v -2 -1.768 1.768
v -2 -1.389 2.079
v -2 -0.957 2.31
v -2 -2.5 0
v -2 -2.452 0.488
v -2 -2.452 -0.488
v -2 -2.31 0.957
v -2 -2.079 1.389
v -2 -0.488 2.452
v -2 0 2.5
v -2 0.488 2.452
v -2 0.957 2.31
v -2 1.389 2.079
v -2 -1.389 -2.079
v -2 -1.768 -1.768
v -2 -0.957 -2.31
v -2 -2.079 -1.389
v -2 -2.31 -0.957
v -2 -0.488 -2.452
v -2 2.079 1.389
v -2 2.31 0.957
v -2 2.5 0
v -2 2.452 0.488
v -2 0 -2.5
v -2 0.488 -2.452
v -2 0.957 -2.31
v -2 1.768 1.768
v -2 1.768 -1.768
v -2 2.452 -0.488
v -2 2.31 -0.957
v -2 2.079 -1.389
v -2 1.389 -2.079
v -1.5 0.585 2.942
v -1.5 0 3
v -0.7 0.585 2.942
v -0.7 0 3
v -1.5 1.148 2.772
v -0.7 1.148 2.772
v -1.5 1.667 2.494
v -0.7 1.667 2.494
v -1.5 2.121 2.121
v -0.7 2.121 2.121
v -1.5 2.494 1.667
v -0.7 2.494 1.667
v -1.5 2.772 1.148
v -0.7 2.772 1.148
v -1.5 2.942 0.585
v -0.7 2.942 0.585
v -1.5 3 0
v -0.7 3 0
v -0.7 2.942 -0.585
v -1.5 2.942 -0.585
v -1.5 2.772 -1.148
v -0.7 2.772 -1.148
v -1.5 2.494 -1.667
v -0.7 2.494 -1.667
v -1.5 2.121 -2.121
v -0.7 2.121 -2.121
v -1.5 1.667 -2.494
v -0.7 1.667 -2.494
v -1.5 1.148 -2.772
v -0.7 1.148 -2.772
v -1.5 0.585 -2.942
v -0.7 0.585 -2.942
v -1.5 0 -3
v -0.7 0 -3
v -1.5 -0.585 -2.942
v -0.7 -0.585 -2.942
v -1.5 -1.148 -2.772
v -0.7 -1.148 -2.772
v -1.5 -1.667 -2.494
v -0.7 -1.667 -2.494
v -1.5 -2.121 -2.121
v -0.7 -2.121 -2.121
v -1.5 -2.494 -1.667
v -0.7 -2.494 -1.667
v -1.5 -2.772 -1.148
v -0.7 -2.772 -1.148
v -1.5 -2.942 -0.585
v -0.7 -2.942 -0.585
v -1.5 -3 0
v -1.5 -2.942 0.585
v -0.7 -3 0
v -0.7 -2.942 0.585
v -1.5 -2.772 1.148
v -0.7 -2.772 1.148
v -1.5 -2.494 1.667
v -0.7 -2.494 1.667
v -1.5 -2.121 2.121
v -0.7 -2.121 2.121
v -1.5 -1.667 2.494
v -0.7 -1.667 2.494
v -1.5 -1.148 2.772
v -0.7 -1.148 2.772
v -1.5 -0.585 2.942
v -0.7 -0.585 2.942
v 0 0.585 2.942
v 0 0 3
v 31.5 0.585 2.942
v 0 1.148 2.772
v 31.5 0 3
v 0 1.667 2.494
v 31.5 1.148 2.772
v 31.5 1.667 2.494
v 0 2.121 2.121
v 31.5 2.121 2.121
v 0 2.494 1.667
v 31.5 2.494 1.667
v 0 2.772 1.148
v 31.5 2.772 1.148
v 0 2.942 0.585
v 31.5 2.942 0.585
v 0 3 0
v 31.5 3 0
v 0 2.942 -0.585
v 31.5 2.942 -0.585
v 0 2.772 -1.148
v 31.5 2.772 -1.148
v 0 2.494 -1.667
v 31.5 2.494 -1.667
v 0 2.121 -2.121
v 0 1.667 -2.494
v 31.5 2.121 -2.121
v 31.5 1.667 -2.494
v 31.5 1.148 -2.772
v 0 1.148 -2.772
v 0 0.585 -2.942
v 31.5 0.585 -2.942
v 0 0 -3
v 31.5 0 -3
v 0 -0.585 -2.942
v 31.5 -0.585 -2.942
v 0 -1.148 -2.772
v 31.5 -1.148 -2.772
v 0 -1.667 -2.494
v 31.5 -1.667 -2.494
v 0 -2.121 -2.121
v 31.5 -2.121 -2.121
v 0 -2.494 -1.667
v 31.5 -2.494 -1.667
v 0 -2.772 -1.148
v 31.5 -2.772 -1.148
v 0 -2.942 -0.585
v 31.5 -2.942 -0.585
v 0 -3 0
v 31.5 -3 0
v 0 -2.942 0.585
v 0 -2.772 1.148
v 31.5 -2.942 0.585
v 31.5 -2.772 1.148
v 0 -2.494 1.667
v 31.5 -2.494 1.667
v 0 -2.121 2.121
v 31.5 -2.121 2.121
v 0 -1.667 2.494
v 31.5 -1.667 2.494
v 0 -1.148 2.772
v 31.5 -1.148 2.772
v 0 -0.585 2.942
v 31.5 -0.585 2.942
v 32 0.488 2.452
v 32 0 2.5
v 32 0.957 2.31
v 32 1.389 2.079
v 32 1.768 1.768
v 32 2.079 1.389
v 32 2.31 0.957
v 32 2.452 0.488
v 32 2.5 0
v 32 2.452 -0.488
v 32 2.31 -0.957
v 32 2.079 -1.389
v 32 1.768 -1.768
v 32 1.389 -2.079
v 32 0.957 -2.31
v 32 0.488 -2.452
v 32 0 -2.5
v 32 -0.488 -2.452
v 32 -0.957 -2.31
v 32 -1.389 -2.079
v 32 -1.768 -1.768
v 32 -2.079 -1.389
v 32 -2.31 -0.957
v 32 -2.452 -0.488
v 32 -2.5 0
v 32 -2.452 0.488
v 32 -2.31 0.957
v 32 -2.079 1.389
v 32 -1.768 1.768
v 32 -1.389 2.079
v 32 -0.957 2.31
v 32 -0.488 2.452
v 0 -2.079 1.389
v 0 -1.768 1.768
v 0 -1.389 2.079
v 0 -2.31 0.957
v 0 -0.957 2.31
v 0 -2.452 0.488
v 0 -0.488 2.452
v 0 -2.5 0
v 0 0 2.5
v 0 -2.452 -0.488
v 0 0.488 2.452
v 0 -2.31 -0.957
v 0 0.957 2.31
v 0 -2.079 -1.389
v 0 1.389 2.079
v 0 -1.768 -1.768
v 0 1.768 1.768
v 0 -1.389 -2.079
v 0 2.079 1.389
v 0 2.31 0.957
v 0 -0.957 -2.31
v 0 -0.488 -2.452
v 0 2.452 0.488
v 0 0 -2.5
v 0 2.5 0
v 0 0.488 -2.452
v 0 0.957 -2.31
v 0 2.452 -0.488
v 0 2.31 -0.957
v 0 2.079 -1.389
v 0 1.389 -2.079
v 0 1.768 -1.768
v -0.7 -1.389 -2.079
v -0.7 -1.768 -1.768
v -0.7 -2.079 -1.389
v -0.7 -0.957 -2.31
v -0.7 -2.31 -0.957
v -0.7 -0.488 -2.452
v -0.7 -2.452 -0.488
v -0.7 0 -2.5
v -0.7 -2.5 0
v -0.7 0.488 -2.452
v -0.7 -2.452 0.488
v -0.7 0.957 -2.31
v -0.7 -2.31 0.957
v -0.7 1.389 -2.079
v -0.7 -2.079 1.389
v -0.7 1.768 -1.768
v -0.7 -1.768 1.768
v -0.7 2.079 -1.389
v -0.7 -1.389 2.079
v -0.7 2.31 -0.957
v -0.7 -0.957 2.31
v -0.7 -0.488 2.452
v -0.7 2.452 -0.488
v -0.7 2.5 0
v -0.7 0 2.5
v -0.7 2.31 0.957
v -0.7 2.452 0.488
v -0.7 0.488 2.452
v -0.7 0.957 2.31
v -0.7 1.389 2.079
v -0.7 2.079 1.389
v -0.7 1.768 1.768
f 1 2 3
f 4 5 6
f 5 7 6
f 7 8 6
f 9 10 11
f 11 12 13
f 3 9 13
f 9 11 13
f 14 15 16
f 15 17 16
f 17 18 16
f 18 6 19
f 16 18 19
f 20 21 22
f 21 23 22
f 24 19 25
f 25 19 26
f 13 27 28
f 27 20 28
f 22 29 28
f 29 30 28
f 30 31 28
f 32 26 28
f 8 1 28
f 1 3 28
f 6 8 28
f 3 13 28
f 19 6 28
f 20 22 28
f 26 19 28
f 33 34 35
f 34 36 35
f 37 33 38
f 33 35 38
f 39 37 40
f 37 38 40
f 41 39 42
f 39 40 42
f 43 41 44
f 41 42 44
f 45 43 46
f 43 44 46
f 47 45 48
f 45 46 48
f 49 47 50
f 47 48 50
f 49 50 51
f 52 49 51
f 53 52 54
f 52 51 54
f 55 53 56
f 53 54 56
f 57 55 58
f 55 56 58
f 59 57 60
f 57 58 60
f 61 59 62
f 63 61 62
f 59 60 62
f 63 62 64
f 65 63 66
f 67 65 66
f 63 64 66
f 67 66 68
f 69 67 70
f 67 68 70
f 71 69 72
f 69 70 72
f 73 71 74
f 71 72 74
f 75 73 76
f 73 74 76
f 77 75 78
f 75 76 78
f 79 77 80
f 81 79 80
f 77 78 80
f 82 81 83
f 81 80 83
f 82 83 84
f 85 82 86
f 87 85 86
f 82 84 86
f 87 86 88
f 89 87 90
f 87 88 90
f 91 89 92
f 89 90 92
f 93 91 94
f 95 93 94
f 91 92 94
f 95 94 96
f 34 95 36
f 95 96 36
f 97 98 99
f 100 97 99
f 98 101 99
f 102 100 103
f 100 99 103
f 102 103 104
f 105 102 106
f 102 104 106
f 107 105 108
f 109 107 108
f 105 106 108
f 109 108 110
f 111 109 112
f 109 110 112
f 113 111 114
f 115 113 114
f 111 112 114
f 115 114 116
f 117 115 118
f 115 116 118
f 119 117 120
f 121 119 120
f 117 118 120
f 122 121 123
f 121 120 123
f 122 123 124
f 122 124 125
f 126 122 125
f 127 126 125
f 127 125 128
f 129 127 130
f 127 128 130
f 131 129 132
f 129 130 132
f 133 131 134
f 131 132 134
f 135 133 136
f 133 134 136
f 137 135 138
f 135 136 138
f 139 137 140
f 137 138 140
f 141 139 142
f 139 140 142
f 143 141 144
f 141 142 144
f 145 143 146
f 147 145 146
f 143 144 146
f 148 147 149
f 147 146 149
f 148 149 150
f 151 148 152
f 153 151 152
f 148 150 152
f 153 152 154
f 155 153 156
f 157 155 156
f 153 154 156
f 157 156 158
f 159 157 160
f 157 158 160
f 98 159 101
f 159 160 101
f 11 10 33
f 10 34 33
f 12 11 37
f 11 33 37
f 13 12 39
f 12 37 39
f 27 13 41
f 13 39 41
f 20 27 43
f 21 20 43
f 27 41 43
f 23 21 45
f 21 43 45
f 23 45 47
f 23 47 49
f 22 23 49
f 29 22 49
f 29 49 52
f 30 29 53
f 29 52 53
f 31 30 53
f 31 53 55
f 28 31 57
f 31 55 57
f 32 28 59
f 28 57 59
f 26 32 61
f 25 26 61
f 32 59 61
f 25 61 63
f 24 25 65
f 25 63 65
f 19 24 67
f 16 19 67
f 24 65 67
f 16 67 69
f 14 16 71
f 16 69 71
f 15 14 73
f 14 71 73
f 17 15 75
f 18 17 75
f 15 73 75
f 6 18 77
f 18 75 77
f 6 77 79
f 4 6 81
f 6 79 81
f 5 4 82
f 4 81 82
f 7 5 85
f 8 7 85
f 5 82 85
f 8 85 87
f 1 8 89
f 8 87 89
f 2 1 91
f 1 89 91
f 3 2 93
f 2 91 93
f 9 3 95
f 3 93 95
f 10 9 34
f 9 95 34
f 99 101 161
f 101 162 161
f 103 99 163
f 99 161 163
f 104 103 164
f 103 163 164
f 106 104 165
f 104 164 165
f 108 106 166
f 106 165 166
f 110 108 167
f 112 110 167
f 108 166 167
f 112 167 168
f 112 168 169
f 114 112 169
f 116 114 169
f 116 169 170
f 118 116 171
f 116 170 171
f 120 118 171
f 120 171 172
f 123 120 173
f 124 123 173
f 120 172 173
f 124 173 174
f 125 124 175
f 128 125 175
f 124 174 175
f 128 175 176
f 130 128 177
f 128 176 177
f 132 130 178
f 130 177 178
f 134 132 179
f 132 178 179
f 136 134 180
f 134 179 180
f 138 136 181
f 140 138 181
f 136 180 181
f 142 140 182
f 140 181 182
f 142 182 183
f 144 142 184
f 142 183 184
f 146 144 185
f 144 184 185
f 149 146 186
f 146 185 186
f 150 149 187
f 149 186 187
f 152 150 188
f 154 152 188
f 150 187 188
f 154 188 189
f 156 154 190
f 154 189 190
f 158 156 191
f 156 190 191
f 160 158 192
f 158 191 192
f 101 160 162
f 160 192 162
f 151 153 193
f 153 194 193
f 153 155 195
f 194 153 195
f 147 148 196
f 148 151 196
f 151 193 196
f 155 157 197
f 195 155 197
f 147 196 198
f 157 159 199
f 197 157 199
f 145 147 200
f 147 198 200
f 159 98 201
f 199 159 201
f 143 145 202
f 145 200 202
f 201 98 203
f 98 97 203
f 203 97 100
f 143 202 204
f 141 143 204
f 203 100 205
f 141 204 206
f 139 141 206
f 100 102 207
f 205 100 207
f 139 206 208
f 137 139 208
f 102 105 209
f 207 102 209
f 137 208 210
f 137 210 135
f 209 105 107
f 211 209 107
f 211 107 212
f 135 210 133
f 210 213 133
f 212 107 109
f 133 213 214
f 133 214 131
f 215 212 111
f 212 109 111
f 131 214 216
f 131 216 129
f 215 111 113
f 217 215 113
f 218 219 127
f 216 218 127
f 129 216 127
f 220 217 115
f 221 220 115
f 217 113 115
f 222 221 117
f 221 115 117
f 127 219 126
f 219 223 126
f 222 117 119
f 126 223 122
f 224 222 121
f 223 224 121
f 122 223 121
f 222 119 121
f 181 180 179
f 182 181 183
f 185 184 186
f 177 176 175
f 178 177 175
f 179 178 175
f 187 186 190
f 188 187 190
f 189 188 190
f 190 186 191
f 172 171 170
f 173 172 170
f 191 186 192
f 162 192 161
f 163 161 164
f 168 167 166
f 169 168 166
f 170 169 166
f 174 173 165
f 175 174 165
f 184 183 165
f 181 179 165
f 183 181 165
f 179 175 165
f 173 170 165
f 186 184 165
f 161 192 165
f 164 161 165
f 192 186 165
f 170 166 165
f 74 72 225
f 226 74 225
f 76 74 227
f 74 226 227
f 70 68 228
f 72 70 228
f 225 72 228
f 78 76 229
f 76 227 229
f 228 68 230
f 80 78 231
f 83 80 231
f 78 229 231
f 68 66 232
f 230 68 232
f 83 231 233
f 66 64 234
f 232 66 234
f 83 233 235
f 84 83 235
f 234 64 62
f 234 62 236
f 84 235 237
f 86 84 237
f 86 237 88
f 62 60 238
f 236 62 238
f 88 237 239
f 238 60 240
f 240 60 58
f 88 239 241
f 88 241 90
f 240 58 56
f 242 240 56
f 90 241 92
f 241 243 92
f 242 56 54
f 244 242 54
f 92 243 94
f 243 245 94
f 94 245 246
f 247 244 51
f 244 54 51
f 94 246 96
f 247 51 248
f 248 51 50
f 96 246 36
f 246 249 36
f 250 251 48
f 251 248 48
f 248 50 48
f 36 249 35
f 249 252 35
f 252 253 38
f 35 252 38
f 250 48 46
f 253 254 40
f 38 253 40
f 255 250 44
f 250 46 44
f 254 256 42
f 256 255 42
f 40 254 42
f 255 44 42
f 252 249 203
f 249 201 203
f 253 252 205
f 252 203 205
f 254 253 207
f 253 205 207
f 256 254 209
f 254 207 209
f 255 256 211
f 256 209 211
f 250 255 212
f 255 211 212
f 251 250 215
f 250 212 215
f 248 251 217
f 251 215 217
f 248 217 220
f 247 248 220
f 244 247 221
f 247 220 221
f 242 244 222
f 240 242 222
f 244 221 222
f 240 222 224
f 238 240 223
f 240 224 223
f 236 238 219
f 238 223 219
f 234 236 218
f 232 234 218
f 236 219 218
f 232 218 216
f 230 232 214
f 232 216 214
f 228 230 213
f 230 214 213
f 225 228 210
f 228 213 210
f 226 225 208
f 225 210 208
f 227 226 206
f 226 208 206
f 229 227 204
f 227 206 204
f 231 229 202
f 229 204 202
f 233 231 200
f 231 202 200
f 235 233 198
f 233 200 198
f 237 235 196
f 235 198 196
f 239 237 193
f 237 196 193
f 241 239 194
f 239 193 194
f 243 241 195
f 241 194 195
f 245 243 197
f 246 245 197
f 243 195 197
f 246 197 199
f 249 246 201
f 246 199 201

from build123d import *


with BuildPart() as part:
    # Sketch1 → Revolve1 (revolve)
    with BuildSketch(Plane.XY, mode=Mode.PRIVATE) as revolve1_sk:
        Polygon((0, 0), (0, 3), (31.5, 3), (32, 2.5), (32, 0), align=None)
    revolve(revolve1_sk.sketch.rotate(Axis((32, 0, 0), (-1, 0, 0)), 270), axis=Axis((32, 0, 0), (-1, 0, 0)))

    # Sketch2 → Revolve2 (revolve)
    with BuildSketch(Plane.XY, mode=Mode.PRIVATE) as revolve2_sk:
        Polygon((-2, 0), (-2, 2.5), (-1.5, 3), (-0.7, 3), (-0.7, 2.5), (0, 2.5), (0, 0), align=None)
    revolve(revolve2_sk.sketch.rotate(Axis((0, 0, 0), (-1, 0, 0)), 270), axis=Axis((0, 0, 0), (-1, 0, 0)))


solid = part.part
